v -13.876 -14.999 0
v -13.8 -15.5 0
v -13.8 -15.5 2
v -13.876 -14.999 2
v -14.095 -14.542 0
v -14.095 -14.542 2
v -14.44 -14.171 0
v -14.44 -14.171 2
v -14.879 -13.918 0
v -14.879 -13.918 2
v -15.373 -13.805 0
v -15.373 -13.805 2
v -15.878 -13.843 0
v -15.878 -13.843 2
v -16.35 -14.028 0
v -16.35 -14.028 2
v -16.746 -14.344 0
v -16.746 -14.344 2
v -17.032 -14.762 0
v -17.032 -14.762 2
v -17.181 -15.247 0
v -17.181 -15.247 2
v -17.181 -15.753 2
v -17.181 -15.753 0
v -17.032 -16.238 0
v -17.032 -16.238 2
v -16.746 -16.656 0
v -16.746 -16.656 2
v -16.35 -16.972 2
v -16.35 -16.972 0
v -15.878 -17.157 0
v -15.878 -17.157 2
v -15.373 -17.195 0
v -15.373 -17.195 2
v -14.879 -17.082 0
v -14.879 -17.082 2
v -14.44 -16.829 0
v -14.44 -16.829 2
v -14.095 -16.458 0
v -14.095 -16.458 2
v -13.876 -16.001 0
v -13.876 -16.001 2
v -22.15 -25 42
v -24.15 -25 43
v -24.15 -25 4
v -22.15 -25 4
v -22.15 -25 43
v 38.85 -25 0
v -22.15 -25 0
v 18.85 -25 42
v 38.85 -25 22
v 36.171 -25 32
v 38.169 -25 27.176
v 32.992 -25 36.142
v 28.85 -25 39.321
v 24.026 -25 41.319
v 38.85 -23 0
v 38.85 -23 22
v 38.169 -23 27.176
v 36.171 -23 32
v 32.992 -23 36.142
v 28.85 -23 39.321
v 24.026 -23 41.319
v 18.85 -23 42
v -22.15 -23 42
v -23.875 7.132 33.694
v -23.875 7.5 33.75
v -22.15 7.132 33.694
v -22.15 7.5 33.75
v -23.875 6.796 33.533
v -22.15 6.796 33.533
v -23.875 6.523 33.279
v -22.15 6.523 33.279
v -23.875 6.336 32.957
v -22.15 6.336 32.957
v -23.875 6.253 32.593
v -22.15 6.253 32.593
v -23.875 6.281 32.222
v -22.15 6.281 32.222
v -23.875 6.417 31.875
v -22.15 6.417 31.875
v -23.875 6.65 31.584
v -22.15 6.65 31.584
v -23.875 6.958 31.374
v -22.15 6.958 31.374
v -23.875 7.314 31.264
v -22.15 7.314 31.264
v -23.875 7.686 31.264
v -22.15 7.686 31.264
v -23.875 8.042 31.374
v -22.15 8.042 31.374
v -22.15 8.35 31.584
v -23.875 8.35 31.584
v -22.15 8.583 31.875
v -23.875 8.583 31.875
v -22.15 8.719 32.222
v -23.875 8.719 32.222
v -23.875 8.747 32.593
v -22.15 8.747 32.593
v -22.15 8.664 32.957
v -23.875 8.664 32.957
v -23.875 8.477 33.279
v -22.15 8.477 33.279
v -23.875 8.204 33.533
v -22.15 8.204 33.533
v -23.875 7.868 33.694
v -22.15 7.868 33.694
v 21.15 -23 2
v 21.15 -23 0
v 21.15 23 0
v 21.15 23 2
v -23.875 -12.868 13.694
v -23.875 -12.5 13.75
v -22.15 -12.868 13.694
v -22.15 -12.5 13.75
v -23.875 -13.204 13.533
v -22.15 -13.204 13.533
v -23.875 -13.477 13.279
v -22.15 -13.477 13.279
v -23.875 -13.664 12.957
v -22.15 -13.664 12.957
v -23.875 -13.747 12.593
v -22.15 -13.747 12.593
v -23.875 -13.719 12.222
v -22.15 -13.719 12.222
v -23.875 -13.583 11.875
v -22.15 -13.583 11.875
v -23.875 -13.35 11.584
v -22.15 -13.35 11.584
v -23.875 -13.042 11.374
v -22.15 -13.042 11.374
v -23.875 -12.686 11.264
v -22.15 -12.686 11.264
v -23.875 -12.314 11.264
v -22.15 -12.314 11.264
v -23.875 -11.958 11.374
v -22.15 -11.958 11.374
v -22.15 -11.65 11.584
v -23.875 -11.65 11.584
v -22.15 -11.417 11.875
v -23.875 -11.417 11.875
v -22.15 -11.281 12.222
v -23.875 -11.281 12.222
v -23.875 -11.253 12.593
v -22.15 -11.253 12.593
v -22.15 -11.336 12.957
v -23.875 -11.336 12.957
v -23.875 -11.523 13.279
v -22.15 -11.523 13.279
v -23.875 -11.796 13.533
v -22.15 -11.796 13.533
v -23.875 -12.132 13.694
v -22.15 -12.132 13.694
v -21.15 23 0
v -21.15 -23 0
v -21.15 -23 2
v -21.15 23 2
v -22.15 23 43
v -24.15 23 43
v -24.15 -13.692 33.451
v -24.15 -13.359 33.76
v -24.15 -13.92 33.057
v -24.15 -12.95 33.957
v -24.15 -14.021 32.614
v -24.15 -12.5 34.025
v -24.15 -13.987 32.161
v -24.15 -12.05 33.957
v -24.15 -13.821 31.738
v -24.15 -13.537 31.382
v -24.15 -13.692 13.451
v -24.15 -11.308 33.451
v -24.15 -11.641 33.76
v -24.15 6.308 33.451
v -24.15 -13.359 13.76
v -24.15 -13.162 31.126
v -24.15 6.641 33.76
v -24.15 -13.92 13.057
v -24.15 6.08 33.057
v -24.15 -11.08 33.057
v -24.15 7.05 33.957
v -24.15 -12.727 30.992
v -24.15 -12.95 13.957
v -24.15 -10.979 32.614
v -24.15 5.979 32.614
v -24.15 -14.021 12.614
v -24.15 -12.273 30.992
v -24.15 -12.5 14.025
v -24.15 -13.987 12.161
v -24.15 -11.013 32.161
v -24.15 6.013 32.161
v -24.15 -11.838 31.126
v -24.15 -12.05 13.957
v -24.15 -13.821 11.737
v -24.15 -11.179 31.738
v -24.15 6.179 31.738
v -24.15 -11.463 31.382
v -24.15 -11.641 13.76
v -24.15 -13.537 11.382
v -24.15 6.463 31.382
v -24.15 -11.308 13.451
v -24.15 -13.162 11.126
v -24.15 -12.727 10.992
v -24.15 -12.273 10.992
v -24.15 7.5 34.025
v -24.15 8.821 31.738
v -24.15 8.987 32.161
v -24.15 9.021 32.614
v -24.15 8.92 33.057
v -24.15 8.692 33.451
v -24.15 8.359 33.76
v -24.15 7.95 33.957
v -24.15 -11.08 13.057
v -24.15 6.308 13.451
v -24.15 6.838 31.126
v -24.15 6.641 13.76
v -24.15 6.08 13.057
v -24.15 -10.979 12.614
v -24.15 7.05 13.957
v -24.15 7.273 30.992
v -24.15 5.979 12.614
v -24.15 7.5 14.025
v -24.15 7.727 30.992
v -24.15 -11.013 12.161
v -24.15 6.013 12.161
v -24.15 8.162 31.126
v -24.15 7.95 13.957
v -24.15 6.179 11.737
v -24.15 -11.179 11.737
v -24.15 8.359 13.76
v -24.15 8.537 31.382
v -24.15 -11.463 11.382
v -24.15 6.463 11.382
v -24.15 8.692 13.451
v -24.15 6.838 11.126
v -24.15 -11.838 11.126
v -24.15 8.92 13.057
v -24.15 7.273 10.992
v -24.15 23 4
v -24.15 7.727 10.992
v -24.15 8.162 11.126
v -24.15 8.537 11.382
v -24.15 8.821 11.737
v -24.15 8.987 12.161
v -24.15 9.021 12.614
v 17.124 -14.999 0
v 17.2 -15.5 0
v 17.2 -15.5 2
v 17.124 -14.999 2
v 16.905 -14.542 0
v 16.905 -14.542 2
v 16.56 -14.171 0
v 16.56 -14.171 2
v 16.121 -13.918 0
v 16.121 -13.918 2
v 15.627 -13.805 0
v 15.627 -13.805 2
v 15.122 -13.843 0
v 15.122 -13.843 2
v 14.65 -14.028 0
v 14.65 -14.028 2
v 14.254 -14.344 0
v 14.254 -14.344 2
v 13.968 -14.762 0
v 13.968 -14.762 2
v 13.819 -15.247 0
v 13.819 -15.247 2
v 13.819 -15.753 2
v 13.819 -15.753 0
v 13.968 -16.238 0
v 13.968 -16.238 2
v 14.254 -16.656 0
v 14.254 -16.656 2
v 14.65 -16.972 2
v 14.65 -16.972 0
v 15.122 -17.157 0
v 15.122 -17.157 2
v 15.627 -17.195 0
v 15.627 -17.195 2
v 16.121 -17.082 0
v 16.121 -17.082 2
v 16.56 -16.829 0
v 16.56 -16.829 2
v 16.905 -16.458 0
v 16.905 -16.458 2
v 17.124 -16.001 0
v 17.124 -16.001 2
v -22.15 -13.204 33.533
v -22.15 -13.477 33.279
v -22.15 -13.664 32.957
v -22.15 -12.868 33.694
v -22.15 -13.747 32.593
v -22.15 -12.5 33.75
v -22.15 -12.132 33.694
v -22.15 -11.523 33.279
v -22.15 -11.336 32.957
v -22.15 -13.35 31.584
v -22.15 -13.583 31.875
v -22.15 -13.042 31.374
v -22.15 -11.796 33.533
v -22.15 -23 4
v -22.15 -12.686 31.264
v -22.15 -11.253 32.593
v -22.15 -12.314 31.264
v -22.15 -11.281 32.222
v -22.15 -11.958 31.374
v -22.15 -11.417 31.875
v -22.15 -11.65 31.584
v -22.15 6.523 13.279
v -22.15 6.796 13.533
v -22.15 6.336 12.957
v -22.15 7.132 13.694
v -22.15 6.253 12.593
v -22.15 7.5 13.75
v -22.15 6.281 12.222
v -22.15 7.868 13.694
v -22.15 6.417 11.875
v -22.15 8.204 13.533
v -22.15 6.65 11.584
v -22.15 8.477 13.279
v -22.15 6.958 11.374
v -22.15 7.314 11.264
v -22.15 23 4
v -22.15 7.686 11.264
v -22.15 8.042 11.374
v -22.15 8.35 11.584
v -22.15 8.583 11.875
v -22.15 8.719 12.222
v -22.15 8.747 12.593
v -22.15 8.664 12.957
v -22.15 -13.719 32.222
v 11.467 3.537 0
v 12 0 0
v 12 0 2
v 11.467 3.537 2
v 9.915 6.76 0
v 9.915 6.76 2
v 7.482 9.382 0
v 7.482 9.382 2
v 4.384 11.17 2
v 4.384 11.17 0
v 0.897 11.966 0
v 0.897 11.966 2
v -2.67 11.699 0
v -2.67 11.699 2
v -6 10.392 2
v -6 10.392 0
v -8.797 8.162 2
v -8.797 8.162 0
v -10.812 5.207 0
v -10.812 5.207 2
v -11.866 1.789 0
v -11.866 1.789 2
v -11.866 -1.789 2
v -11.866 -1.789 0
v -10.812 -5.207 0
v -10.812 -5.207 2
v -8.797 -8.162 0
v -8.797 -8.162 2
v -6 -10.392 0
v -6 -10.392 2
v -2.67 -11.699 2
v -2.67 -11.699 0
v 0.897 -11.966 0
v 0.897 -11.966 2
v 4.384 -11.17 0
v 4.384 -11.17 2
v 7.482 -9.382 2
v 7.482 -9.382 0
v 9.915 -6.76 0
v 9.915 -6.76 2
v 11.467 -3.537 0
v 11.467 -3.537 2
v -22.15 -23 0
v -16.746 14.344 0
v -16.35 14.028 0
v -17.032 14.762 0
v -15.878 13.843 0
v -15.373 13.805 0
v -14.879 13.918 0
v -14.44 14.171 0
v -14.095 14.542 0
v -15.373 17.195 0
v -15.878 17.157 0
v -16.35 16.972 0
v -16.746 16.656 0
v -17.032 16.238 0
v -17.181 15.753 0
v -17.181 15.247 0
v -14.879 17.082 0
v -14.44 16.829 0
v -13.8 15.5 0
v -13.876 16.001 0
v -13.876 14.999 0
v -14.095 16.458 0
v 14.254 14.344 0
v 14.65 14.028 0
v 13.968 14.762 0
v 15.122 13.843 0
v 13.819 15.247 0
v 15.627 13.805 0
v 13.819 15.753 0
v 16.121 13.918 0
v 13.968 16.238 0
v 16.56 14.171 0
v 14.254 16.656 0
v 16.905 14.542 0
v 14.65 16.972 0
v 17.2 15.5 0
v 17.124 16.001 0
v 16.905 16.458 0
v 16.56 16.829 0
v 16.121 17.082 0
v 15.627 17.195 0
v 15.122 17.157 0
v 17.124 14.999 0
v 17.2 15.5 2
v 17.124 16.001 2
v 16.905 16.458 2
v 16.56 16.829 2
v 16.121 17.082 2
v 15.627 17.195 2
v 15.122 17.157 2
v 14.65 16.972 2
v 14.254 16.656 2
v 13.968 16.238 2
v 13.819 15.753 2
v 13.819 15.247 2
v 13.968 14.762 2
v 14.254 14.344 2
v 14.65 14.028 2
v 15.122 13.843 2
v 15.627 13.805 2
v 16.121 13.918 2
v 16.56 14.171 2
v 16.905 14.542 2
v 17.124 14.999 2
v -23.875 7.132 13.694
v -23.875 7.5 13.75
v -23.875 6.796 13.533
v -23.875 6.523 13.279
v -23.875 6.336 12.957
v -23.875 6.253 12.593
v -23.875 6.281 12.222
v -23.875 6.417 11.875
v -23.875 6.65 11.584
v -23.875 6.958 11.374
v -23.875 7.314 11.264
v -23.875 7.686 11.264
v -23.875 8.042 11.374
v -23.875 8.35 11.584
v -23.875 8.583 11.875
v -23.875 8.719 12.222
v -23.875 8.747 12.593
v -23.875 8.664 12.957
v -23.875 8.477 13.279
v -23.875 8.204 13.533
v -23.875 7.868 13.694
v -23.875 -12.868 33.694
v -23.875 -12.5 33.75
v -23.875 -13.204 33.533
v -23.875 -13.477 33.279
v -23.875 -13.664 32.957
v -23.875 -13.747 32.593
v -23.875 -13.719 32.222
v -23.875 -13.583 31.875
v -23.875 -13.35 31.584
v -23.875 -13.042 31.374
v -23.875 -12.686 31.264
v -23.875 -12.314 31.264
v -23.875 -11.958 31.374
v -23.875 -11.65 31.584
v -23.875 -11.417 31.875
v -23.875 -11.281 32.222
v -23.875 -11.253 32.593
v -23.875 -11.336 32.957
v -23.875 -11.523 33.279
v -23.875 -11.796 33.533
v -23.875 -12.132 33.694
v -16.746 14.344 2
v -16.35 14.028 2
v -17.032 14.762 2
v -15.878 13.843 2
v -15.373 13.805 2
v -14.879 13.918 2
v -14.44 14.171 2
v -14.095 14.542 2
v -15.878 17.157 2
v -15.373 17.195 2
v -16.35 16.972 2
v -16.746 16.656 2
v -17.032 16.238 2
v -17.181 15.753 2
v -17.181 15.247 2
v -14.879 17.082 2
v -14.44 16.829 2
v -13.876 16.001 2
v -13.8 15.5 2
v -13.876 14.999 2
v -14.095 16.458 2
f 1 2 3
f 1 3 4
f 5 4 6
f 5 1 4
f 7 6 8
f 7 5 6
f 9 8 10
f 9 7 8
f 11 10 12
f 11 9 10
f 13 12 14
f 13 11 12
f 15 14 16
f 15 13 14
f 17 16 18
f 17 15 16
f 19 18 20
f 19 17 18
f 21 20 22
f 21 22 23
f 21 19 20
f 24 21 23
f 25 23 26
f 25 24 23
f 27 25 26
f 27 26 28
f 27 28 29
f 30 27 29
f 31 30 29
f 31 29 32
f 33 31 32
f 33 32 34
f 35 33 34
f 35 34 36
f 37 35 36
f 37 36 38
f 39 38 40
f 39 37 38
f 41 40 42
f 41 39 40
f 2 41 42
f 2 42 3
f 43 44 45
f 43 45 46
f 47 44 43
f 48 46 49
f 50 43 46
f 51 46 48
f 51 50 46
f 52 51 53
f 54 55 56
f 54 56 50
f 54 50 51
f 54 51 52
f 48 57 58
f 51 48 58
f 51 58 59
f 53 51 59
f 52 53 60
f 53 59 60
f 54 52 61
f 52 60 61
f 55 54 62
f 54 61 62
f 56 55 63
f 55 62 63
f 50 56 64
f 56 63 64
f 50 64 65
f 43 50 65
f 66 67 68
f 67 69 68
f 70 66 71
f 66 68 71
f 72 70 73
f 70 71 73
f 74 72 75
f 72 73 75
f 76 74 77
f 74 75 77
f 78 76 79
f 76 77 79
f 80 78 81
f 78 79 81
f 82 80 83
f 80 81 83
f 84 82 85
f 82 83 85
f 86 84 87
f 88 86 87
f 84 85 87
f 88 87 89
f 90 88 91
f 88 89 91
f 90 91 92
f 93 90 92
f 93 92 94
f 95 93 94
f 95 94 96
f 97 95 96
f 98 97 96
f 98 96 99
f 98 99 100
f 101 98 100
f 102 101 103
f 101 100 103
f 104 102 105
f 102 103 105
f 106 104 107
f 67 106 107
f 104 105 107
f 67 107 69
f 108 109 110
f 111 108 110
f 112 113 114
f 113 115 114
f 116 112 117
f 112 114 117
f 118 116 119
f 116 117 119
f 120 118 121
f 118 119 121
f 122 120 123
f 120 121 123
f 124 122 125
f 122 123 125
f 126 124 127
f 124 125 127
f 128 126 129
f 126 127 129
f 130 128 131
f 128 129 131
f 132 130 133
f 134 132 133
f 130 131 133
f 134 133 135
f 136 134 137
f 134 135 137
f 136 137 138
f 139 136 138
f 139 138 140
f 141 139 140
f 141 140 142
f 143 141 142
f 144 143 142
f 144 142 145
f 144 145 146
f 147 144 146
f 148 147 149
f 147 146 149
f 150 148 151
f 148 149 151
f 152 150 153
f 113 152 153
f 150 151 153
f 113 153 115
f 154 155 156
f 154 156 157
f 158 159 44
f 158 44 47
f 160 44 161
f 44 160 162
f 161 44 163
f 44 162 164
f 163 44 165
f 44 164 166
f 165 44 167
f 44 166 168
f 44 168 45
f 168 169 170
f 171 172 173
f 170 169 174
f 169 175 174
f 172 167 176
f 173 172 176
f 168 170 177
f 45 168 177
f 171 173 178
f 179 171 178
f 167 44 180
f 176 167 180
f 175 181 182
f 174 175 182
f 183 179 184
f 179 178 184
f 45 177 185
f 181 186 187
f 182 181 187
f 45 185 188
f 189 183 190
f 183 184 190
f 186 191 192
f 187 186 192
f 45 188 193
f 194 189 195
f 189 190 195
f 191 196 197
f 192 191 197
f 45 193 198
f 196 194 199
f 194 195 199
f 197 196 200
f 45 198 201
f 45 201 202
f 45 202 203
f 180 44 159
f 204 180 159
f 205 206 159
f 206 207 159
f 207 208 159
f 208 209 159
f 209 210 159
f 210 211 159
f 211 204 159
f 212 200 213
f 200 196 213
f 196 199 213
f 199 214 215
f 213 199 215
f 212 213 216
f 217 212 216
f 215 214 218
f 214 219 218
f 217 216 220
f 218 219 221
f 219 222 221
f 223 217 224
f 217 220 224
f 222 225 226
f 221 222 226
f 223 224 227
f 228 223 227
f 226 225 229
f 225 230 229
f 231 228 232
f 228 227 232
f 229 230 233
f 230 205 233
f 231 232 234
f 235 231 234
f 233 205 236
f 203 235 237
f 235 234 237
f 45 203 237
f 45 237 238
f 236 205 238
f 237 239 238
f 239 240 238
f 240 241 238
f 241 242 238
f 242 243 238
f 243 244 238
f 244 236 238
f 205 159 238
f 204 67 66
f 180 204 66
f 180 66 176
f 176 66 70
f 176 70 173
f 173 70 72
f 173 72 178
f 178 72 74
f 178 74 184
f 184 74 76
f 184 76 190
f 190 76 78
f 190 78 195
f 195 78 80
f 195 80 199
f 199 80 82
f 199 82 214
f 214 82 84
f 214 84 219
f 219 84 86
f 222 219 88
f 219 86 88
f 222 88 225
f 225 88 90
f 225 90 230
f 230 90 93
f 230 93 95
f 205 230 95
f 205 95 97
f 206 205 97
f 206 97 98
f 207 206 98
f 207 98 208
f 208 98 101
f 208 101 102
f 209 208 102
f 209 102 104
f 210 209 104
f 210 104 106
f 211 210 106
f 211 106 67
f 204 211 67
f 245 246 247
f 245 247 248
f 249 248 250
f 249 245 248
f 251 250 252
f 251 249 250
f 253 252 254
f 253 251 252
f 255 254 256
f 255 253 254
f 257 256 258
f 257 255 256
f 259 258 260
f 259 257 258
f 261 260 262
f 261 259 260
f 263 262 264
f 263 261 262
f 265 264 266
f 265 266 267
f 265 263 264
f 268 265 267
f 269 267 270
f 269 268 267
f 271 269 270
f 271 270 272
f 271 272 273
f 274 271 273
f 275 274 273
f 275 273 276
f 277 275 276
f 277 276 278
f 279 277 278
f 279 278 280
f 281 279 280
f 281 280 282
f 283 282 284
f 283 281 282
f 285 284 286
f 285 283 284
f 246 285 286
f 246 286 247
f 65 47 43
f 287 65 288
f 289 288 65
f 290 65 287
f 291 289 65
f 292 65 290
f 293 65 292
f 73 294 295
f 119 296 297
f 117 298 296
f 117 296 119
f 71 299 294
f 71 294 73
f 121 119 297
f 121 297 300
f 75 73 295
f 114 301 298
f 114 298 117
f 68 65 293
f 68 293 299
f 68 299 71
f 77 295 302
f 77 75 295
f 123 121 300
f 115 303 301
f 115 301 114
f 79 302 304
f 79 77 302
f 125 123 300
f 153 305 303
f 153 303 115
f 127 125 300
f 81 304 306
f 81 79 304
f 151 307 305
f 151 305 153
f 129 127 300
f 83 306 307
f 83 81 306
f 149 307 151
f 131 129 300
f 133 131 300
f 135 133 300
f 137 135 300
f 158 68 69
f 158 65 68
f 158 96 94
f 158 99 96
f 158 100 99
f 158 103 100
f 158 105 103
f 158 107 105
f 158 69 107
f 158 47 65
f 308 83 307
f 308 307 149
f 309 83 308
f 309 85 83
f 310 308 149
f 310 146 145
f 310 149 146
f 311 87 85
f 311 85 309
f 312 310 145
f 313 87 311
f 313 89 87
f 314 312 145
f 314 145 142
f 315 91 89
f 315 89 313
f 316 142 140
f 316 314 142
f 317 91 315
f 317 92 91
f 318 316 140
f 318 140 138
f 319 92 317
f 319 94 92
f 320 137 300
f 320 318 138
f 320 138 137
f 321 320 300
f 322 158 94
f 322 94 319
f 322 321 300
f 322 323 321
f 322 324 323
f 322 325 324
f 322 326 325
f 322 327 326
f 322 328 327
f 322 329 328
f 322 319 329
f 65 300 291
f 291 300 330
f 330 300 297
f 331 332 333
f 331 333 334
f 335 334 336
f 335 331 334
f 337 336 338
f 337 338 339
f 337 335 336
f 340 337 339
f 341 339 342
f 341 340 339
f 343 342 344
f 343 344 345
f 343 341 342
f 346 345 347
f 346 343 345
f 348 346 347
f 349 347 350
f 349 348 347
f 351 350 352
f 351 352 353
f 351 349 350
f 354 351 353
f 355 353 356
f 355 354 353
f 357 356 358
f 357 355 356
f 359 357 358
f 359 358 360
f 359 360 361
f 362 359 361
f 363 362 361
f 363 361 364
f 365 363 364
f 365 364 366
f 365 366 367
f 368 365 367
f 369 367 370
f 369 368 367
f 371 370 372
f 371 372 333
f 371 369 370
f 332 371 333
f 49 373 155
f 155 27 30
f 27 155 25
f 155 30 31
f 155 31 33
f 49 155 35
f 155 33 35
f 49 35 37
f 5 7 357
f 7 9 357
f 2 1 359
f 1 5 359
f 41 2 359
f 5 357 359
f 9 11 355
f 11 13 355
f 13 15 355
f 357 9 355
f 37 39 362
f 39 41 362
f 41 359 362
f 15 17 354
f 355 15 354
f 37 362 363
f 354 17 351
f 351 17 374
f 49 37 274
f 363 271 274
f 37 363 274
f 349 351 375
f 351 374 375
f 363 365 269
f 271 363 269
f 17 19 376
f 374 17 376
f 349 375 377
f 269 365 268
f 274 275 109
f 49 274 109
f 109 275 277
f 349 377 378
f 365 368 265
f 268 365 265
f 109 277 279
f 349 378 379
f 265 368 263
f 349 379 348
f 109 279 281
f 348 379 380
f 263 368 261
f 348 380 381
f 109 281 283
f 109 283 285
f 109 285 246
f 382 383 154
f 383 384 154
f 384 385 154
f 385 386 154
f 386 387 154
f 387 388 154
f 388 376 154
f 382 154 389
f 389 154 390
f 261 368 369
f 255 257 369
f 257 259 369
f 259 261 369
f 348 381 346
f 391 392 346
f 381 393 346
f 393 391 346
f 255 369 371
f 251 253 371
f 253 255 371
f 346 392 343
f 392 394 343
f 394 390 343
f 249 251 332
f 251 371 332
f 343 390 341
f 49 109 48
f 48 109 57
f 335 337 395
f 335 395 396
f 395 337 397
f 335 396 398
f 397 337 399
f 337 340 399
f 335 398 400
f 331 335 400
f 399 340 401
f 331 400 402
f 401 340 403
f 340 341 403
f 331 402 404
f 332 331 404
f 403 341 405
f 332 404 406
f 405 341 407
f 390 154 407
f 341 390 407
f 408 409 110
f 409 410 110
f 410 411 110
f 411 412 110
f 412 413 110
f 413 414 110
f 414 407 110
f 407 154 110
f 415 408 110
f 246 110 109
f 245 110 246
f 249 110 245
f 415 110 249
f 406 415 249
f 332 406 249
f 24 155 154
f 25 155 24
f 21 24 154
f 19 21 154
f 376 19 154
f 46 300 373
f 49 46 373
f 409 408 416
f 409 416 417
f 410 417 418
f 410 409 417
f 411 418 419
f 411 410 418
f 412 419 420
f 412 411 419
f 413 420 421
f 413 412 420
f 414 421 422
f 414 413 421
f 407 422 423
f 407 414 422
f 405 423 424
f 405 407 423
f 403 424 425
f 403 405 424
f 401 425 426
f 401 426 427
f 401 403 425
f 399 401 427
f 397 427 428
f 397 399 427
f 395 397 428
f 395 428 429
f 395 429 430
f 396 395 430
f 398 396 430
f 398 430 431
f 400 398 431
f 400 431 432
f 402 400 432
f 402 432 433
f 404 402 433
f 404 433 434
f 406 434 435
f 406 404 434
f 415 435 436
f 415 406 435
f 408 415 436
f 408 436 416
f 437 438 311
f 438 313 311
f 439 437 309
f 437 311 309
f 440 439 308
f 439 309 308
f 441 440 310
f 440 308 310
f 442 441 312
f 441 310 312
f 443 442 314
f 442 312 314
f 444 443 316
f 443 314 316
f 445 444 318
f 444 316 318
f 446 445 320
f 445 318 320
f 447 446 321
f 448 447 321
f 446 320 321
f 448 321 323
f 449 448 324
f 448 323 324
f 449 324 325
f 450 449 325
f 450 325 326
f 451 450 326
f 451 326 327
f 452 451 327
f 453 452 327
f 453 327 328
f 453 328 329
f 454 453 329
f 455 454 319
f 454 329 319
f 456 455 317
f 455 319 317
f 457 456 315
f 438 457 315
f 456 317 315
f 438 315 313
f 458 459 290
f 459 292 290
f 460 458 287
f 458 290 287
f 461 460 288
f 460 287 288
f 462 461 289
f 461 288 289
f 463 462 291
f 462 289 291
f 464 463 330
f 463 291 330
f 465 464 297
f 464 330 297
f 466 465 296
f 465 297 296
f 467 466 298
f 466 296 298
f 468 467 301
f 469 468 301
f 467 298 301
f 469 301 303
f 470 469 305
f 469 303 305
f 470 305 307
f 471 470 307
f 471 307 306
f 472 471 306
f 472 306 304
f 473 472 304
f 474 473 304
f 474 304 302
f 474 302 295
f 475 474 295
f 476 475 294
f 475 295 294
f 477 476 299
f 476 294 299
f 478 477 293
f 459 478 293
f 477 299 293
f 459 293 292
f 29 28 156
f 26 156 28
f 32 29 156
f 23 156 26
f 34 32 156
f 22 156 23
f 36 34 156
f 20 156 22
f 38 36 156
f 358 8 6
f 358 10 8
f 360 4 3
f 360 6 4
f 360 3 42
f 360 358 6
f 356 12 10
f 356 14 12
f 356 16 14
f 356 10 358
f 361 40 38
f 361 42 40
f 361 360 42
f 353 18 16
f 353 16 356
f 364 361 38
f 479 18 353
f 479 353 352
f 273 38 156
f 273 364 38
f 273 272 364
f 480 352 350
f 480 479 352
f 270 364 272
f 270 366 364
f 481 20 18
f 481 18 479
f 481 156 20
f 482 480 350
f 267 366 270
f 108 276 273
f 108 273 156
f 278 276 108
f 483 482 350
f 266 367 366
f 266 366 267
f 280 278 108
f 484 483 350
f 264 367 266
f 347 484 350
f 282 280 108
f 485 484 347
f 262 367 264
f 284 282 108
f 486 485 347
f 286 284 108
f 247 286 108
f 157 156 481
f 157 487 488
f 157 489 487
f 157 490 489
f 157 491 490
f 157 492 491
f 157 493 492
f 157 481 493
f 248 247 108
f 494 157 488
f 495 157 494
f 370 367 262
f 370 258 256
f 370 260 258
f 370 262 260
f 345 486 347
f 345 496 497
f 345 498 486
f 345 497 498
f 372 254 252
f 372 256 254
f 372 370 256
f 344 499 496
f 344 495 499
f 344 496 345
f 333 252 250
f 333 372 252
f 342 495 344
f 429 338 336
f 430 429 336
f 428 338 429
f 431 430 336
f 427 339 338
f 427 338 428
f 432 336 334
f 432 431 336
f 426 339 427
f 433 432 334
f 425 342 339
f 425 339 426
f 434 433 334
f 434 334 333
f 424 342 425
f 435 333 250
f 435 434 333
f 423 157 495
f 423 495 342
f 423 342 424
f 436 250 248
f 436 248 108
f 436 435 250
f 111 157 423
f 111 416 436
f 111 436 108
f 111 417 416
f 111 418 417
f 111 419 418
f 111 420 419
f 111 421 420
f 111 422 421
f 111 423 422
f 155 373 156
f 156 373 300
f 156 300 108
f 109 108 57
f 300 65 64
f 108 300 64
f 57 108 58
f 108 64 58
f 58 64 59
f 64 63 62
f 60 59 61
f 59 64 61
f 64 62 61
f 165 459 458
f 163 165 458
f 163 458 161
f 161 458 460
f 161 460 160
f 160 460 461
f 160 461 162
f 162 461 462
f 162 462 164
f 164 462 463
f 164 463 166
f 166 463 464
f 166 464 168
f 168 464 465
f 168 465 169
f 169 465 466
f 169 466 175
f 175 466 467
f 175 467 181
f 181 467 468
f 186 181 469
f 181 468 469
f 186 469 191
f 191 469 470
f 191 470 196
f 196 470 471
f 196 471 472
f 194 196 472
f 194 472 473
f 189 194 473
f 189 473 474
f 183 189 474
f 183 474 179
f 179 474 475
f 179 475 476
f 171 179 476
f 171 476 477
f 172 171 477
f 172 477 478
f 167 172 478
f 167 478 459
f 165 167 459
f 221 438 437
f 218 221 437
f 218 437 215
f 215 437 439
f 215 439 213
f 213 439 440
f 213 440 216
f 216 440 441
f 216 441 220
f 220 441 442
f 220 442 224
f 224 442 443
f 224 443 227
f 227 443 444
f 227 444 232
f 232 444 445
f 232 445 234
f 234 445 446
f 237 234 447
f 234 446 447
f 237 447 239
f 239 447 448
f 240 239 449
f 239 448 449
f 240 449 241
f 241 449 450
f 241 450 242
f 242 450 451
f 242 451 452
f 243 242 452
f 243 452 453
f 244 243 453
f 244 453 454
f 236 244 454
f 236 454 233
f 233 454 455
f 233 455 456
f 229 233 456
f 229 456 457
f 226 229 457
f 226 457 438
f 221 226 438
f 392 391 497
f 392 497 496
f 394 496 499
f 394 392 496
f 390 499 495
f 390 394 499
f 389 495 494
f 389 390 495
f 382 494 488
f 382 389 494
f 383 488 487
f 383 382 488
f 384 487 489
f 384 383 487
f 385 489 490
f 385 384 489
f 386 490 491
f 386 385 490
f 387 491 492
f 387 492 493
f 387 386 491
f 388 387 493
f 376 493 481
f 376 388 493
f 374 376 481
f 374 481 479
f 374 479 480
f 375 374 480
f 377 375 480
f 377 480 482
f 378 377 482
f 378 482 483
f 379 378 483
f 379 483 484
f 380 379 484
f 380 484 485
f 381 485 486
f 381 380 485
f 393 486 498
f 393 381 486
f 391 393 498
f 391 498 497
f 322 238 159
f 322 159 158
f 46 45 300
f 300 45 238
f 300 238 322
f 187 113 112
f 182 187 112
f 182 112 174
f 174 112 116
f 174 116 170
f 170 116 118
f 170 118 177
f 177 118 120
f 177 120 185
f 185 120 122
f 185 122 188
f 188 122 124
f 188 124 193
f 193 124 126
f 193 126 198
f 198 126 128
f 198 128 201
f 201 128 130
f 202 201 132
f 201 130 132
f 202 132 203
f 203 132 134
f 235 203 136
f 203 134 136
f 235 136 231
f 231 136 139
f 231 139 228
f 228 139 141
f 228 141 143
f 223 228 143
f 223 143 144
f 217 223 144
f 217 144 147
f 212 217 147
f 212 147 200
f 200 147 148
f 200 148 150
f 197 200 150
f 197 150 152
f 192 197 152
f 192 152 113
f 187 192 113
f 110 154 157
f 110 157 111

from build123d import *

# Parameters (mm, degrees)
SKETCH1_W                   = 42.3
SKETCH1_H                   = 46
SKETCH1_R                   = 12
SKETCH1_R_2                 = 1.7
BOSS_EXTRUDE1_DEPTH         = 2
BOSS_EXTRUDE4_DEPTH         = 2
BOSS_EXTRUDE6_REACH         = 76.681
SKETCH6_W                   = 2
SKETCH6_H                   = 39
M3_TAPPED_HOLE2_D           = 2.5
M3_TAPPED_HOLE2_CSINK_D     = 3.05
M3_TAPPED_HOLE2_CSINK_ANGLE = 90


with BuildPart() as part:
    # Sketch1 → Boss-Extrude1 (new body)
    with BuildSketch(Plane.XY):
        Rectangle(SKETCH1_W, SKETCH1_H)
        Circle(SKETCH1_R, mode=Mode.SUBTRACT)
        with Locations((-15.5, 15.5)):
            Circle(SKETCH1_R_2, mode=Mode.SUBTRACT)
        with Locations((15.5, 15.5)):
            Circle(SKETCH1_R_2, mode=Mode.SUBTRACT)
        with Locations((15.5, -15.5)):
            Circle(SKETCH1_R_2, mode=Mode.SUBTRACT)
        with Locations((-15.5, -15.5)):
            Circle(SKETCH1_R_2, mode=Mode.SUBTRACT)
    extrude(amount=BOSS_EXTRUDE1_DEPTH)

    # Sketch4 → Boss-Extrude4 (add)
    with BuildSketch(Plane.XZ.offset(23)):
        with BuildLine():
            Line((-21.15, 0), (38.85, 0))
            Line((38.85, 0), (38.85, 22))
            ThreePointArc((38.85, 22), (32.992135624, 36.142135624), (18.85, 42))
            Line((18.85, 42), (-21.15, 42))
            Line((-21.15, 42), (-22.15, 42))
            Line((-22.15, 42), (-22.15, 0))
            Line((-22.15, 0), (-21.15, 0))
        make_face()
    extrude(amount=BOSS_EXTRUDE4_DEPTH)

    # Boss-Extrude6: up to this face of the body (flat: up to its plane)
    boss_extrude6_end = Plane(part.part.faces().sort_by_distance((7.447529356, -25, 20.426864787))[0])
    # Sketch6 → Boss-Extrude6 (add, up to the picked face)
    with BuildSketch(Plane(origin=(0, 23, 0), x_dir=(1, 0, 0), z_dir=(0, 1, 0)), mode=Mode.PRIVATE) as boss_extrude6_sk1:
        with Locations((-23.15, -23.5)):
            Rectangle(SKETCH6_W, SKETCH6_H)
    boss_extrude6_tool1 = split(extrude(boss_extrude6_sk1.sketch, amount=-BOSS_EXTRUDE6_REACH, mode=Mode.PRIVATE), bisect_by=boss_extrude6_end, keep=Keep.BOTH, mode=Mode.PRIVATE)
    add(boss_extrude6_tool1.solids().sort_by(Axis((-23.15, 23, 23.5), (0, -1, 0)))[0])

    # M3 Tapped Hole2 (through all)
    with Locations(Plane(origin=(-24.15, 7.5, 12.5), x_dir=(0, 0, -1), z_dir=(-1, 0, 0))):
        with Locations((0, 0), (-20, 0), (-20, 20), (0, 20)):
            CounterSinkHole(M3_TAPPED_HOLE2_D / 2, M3_TAPPED_HOLE2_CSINK_D / 2, counter_sink_angle=M3_TAPPED_HOLE2_CSINK_ANGLE)


solid = part.part
